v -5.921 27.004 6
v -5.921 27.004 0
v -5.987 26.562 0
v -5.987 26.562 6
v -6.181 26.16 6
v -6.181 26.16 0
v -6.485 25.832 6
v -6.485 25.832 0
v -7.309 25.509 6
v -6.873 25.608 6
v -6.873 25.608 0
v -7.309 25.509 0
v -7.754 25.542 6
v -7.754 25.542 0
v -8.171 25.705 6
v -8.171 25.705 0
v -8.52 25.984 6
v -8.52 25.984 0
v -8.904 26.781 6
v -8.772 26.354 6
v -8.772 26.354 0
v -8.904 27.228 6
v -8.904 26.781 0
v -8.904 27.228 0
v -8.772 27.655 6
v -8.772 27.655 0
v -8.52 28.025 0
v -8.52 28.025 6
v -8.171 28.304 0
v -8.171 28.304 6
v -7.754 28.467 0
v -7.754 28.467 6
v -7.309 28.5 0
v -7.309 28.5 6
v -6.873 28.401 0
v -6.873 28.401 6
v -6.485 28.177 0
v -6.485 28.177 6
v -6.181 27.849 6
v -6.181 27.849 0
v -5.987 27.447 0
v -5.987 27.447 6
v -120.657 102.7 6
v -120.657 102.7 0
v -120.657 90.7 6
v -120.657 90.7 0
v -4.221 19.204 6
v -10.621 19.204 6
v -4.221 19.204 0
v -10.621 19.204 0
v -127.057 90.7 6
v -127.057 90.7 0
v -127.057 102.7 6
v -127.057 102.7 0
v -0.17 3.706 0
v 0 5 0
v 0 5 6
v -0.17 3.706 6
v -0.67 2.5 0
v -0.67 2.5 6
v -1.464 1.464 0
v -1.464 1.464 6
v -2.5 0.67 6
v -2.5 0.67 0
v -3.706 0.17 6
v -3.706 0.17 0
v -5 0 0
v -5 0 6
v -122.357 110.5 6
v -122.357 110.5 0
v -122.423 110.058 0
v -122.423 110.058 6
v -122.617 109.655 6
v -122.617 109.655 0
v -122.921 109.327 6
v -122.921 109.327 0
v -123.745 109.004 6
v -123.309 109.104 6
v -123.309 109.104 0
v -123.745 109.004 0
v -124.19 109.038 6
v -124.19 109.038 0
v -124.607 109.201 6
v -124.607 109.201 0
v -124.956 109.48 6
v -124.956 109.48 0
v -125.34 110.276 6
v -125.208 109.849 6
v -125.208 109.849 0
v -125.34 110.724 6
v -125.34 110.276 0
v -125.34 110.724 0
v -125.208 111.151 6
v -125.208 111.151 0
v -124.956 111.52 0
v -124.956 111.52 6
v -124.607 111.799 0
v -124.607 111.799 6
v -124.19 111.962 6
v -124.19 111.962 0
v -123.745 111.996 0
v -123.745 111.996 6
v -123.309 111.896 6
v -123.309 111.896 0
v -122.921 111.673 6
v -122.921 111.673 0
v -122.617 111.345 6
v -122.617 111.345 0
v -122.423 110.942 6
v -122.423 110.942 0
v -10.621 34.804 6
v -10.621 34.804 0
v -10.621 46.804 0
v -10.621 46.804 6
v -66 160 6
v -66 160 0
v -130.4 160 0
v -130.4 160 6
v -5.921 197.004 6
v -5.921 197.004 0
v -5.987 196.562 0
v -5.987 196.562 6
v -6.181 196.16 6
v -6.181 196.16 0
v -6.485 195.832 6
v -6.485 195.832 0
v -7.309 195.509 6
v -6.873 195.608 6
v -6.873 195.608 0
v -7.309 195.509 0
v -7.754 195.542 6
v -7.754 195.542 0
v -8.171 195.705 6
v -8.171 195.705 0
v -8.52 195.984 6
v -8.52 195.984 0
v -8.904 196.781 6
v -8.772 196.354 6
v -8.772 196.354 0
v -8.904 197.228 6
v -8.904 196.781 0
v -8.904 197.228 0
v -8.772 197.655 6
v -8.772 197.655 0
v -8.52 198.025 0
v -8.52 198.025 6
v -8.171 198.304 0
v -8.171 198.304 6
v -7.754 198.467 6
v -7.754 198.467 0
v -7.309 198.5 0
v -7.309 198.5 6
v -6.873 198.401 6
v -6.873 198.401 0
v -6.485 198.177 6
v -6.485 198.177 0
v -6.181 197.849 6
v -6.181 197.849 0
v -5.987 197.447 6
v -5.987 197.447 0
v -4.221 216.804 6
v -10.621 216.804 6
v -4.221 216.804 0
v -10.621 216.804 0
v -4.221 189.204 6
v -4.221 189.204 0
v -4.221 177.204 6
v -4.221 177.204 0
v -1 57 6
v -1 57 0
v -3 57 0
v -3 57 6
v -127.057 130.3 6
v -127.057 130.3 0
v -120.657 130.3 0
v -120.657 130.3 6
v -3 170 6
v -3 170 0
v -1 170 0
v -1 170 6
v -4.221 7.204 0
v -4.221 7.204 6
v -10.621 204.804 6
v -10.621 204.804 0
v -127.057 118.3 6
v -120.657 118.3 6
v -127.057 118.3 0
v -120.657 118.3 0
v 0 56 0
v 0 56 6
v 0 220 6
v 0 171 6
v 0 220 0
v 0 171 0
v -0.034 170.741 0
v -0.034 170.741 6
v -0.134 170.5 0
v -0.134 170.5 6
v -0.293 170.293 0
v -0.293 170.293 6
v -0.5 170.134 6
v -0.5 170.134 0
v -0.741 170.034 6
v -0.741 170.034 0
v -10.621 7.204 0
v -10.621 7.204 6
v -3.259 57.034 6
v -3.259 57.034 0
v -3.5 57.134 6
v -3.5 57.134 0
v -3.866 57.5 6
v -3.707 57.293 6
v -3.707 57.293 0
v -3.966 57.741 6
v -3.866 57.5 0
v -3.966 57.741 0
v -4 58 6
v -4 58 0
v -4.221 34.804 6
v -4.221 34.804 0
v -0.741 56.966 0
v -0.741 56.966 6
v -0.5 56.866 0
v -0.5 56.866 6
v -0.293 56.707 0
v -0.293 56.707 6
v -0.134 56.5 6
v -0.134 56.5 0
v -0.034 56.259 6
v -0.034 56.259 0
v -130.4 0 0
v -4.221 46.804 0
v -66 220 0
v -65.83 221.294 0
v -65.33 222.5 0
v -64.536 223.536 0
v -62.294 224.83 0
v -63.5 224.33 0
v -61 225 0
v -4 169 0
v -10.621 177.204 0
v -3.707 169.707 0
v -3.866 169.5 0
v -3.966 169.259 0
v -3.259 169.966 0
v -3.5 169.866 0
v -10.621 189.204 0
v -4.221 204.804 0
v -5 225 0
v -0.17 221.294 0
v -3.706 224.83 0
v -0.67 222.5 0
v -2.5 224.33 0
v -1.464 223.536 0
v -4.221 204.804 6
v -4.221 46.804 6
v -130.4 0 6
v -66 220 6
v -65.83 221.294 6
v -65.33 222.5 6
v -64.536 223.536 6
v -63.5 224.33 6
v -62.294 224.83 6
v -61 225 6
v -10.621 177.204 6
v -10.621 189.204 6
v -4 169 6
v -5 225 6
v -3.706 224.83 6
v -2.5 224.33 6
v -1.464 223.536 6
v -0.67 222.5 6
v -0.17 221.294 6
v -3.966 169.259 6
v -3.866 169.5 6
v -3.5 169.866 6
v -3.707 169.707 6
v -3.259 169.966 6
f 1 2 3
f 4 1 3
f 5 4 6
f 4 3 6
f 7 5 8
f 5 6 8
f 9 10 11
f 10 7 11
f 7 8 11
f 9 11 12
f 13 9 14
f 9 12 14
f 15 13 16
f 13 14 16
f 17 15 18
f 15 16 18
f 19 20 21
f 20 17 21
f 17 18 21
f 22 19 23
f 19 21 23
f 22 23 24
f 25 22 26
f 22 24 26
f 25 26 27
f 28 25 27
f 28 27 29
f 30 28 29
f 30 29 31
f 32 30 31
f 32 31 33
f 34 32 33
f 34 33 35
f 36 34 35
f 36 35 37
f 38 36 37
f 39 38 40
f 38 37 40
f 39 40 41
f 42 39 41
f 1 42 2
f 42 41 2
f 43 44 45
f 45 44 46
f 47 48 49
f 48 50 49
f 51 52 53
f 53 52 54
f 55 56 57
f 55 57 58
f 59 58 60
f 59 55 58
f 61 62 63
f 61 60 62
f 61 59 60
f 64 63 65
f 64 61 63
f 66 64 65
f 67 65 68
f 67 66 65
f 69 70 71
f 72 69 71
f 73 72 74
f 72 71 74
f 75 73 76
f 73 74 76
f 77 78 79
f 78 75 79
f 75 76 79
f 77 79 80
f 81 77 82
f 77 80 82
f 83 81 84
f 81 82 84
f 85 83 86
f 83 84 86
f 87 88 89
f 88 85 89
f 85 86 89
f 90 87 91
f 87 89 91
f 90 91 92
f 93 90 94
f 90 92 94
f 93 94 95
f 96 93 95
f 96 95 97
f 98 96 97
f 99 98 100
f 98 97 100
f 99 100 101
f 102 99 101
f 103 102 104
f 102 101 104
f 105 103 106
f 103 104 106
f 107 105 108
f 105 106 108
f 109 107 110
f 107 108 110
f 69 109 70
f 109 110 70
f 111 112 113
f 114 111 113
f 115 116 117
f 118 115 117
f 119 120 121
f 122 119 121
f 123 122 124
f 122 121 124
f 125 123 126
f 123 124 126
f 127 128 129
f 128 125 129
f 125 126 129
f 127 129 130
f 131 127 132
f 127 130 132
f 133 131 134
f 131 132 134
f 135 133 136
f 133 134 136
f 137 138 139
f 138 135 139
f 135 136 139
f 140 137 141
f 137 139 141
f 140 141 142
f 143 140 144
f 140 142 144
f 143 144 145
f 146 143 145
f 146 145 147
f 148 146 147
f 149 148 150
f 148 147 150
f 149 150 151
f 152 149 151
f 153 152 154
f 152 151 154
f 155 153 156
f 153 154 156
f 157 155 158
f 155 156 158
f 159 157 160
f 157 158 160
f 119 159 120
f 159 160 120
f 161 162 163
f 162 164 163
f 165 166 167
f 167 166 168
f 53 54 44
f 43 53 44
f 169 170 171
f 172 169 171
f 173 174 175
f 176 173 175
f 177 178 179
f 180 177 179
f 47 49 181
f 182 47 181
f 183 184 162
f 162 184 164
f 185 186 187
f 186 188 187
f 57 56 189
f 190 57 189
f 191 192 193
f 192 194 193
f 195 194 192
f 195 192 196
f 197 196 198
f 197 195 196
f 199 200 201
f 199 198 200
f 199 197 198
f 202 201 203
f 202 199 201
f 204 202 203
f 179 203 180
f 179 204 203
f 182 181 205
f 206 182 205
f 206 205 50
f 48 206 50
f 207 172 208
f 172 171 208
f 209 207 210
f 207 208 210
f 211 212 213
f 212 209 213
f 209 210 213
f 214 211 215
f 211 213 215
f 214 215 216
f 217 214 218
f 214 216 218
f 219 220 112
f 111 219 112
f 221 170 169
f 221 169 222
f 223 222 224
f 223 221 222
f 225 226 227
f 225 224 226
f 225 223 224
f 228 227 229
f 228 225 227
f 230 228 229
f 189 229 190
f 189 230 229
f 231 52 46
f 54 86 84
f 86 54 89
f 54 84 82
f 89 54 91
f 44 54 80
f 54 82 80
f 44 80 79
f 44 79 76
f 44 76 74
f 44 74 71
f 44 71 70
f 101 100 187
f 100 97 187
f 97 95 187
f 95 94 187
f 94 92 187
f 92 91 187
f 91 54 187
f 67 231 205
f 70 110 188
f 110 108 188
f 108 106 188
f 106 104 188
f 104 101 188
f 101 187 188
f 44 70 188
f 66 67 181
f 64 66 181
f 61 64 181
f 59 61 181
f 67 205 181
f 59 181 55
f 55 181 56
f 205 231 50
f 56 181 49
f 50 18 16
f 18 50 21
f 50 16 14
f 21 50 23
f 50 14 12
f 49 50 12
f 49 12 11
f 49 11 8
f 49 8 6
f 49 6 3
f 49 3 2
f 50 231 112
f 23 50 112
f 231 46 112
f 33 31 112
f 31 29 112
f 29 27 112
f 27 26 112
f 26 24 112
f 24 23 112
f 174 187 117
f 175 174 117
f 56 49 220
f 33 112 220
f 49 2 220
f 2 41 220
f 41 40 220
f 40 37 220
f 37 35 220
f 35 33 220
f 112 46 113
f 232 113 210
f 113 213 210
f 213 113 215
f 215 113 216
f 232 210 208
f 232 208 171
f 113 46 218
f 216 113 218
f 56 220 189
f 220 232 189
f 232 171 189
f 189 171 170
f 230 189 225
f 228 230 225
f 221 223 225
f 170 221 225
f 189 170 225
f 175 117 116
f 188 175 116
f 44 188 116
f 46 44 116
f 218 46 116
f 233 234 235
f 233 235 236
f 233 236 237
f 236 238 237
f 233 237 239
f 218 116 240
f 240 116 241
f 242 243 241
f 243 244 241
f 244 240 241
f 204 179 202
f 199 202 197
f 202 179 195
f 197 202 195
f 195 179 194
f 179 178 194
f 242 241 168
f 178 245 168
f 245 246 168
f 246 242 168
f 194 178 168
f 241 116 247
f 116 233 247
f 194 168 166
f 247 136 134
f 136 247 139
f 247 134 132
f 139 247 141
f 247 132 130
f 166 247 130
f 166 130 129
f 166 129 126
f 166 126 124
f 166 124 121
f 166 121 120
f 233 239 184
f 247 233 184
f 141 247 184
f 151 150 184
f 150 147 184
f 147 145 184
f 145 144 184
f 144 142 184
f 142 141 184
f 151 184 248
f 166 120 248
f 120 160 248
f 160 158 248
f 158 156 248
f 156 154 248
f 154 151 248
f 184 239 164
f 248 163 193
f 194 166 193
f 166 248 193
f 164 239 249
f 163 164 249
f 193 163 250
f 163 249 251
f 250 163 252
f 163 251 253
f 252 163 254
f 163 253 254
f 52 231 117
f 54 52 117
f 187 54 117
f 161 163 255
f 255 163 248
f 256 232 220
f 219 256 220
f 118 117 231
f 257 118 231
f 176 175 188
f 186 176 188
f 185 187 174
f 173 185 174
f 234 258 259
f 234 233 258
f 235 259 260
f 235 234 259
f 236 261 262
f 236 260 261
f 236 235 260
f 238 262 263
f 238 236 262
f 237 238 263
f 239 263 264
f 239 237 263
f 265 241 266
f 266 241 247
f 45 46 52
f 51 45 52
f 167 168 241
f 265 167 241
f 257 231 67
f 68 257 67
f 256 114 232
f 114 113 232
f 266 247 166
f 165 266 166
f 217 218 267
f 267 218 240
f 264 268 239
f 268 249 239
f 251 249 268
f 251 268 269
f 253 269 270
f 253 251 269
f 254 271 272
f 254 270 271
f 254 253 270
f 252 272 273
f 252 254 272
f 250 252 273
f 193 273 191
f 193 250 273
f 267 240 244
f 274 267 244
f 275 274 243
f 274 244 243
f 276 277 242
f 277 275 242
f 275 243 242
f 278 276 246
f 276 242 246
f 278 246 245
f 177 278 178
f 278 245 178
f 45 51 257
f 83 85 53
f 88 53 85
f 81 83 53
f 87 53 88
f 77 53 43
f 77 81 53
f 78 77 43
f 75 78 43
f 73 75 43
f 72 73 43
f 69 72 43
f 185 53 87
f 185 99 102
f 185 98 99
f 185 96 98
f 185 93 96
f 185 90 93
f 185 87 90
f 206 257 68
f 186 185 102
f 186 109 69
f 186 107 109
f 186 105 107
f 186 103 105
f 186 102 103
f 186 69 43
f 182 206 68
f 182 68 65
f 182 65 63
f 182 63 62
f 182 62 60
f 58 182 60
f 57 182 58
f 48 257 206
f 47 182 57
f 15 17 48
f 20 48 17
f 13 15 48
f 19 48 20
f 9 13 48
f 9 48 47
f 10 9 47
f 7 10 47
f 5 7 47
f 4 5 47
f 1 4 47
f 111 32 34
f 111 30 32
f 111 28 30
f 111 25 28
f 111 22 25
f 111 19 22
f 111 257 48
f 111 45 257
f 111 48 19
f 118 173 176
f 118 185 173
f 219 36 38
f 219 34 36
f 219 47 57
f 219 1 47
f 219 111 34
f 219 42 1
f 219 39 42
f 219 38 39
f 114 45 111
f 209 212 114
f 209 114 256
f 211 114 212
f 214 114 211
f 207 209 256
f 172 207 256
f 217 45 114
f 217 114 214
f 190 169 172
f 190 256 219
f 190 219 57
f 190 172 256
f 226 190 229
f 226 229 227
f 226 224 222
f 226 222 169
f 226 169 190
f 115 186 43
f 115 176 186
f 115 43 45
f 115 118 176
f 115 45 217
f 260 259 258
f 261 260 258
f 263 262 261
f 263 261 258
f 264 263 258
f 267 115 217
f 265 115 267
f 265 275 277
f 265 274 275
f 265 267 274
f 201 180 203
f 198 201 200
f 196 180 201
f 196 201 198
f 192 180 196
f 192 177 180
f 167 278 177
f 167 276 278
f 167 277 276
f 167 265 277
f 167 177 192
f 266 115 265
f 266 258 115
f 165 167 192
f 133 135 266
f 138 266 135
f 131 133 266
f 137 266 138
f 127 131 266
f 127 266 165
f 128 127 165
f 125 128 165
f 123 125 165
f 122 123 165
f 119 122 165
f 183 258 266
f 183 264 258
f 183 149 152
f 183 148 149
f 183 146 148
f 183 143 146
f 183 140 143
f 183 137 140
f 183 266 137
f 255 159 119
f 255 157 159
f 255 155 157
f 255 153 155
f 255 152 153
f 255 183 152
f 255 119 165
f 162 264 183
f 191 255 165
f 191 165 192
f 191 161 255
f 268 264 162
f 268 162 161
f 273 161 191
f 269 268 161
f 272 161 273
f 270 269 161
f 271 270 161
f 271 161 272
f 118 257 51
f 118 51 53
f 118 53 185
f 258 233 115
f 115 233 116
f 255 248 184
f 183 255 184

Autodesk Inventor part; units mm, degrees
ref_plane "YZ Plane" through (0, 0, 0) normal (1, 0, 0) x (0, 1, 0)
ref_plane "XZ Plane" through (0, 0, 0) normal (0, 1, 0) x (-1, 0, 0)
ref_plane "XY Plane" through (0, 0, 0) normal (0, 0, 1) x (1, 0, 0)
sketch "Sketch1" plane through (0, 0, 0) normal (0, 0, 1) x (1, 0, 0)
  line L0 (-4.2207, 7.2045) -> (-10.6207, 7.2045)
  line L1 (-10.6207, 7.2045) -> (-10.6207, 19.2045)
  line L2 (-10.6207, 19.2045) -> (-4.2207, 19.2045)
  line L3 (-4.2207, 19.2045) -> (-4.2207, 7.2045)
  circle A0 centre (-7.4207, 27.0045) radius 1.5
  line L4 (-4.2207, 34.8045) -> (-10.6207, 34.8045)
  line L5 (-10.6207, 34.8045) -> (-10.6207, 46.8045)
  line L6 (-10.6207, 46.8045) -> (-4.2207, 46.8045)
  line L7 (-4.2207, 46.8045) -> (-4.2207, 34.8045)
  line L8 (-4.2207, 177.2045) -> (-10.6207, 177.2045)
  line L9 (-10.6207, 177.2045) -> (-10.6207, 189.2045)
  line L10 (-10.6207, 189.2045) -> (-4.2207, 189.2045)
  line L11 (-4.2207, 189.2045) -> (-4.2207, 177.2045)
  circle A1 centre (-7.4207, 197.0045) radius 1.5
  line L12 (-4.2207, 204.8045) -> (-10.6207, 204.8045)
  line L13 (-10.6207, 204.8045) -> (-10.6207, 216.8045)
  line L14 (-10.6207, 216.8045) -> (-4.2207, 216.8045)
  line L15 (-4.2207, 216.8045) -> (-4.2207, 204.8045)
  line L16 (-120.6567, 90.7) -> (-127.0567, 90.7)
  line L17 (-127.0567, 90.7) -> (-127.0567, 102.7)
  line L18 (-127.0567, 102.7) -> (-120.6567, 102.7)
  line L19 (-120.6567, 102.7) -> (-120.6567, 90.7)
  circle A2 centre (-123.8567, 110.5) radius 1.5
  line L20 (-120.6567, 118.3) -> (-127.0567, 118.3)
  line L21 (-127.0567, 118.3) -> (-127.0567, 130.3)
  line L22 (-127.0567, 130.3) -> (-120.6567, 130.3)
  line L23 (-120.6567, 130.3) -> (-120.6567, 118.3)
  line L24 (-66, 160) -> (-130.4, 160)
  line L25 (-130.4, 160) -> (-130.4, 0)
  line L26 (-130.4, 0) -> (-5, 0)
  arc A3 (-5, 0) -> (0, 5) centre (-5, 5) ccw
  line L27 (0, 5) -> (0, 56)
  arc A4 (0, 56) -> (-1, 57) centre (-1, 56) ccw
  line L28 (-1, 57) -> (-3, 57)
  arc A5 (-4, 58) -> (-3, 57) centre (-3, 58) ccw
  line L29 (-4, 58) -> (-4, 169)
  arc A6 (-3, 170) -> (-4, 169) centre (-3, 169) ccw
  line L30 (-3, 170) -> (-1, 170)
  arc A7 (-1, 170) -> (0, 171) centre (-1, 171) ccw
  line L31 (0, 171) -> (0, 220)
  arc A8 (0, 220) -> (-5, 225) centre (-5, 220) ccw
  line L32 (-5, 225) -> (-61, 225)
  arc A9 (-61, 225) -> (-66, 220) centre (-61, 220) ccw
  line L33 (-66, 220) -> (-66, 160)
  point P0 (0, 0)
  point P1 (0, 0)
extrude "Extrusion1" add sketch "Sketch1" along normal blind 6
properties part number "boardCaseBottom"
